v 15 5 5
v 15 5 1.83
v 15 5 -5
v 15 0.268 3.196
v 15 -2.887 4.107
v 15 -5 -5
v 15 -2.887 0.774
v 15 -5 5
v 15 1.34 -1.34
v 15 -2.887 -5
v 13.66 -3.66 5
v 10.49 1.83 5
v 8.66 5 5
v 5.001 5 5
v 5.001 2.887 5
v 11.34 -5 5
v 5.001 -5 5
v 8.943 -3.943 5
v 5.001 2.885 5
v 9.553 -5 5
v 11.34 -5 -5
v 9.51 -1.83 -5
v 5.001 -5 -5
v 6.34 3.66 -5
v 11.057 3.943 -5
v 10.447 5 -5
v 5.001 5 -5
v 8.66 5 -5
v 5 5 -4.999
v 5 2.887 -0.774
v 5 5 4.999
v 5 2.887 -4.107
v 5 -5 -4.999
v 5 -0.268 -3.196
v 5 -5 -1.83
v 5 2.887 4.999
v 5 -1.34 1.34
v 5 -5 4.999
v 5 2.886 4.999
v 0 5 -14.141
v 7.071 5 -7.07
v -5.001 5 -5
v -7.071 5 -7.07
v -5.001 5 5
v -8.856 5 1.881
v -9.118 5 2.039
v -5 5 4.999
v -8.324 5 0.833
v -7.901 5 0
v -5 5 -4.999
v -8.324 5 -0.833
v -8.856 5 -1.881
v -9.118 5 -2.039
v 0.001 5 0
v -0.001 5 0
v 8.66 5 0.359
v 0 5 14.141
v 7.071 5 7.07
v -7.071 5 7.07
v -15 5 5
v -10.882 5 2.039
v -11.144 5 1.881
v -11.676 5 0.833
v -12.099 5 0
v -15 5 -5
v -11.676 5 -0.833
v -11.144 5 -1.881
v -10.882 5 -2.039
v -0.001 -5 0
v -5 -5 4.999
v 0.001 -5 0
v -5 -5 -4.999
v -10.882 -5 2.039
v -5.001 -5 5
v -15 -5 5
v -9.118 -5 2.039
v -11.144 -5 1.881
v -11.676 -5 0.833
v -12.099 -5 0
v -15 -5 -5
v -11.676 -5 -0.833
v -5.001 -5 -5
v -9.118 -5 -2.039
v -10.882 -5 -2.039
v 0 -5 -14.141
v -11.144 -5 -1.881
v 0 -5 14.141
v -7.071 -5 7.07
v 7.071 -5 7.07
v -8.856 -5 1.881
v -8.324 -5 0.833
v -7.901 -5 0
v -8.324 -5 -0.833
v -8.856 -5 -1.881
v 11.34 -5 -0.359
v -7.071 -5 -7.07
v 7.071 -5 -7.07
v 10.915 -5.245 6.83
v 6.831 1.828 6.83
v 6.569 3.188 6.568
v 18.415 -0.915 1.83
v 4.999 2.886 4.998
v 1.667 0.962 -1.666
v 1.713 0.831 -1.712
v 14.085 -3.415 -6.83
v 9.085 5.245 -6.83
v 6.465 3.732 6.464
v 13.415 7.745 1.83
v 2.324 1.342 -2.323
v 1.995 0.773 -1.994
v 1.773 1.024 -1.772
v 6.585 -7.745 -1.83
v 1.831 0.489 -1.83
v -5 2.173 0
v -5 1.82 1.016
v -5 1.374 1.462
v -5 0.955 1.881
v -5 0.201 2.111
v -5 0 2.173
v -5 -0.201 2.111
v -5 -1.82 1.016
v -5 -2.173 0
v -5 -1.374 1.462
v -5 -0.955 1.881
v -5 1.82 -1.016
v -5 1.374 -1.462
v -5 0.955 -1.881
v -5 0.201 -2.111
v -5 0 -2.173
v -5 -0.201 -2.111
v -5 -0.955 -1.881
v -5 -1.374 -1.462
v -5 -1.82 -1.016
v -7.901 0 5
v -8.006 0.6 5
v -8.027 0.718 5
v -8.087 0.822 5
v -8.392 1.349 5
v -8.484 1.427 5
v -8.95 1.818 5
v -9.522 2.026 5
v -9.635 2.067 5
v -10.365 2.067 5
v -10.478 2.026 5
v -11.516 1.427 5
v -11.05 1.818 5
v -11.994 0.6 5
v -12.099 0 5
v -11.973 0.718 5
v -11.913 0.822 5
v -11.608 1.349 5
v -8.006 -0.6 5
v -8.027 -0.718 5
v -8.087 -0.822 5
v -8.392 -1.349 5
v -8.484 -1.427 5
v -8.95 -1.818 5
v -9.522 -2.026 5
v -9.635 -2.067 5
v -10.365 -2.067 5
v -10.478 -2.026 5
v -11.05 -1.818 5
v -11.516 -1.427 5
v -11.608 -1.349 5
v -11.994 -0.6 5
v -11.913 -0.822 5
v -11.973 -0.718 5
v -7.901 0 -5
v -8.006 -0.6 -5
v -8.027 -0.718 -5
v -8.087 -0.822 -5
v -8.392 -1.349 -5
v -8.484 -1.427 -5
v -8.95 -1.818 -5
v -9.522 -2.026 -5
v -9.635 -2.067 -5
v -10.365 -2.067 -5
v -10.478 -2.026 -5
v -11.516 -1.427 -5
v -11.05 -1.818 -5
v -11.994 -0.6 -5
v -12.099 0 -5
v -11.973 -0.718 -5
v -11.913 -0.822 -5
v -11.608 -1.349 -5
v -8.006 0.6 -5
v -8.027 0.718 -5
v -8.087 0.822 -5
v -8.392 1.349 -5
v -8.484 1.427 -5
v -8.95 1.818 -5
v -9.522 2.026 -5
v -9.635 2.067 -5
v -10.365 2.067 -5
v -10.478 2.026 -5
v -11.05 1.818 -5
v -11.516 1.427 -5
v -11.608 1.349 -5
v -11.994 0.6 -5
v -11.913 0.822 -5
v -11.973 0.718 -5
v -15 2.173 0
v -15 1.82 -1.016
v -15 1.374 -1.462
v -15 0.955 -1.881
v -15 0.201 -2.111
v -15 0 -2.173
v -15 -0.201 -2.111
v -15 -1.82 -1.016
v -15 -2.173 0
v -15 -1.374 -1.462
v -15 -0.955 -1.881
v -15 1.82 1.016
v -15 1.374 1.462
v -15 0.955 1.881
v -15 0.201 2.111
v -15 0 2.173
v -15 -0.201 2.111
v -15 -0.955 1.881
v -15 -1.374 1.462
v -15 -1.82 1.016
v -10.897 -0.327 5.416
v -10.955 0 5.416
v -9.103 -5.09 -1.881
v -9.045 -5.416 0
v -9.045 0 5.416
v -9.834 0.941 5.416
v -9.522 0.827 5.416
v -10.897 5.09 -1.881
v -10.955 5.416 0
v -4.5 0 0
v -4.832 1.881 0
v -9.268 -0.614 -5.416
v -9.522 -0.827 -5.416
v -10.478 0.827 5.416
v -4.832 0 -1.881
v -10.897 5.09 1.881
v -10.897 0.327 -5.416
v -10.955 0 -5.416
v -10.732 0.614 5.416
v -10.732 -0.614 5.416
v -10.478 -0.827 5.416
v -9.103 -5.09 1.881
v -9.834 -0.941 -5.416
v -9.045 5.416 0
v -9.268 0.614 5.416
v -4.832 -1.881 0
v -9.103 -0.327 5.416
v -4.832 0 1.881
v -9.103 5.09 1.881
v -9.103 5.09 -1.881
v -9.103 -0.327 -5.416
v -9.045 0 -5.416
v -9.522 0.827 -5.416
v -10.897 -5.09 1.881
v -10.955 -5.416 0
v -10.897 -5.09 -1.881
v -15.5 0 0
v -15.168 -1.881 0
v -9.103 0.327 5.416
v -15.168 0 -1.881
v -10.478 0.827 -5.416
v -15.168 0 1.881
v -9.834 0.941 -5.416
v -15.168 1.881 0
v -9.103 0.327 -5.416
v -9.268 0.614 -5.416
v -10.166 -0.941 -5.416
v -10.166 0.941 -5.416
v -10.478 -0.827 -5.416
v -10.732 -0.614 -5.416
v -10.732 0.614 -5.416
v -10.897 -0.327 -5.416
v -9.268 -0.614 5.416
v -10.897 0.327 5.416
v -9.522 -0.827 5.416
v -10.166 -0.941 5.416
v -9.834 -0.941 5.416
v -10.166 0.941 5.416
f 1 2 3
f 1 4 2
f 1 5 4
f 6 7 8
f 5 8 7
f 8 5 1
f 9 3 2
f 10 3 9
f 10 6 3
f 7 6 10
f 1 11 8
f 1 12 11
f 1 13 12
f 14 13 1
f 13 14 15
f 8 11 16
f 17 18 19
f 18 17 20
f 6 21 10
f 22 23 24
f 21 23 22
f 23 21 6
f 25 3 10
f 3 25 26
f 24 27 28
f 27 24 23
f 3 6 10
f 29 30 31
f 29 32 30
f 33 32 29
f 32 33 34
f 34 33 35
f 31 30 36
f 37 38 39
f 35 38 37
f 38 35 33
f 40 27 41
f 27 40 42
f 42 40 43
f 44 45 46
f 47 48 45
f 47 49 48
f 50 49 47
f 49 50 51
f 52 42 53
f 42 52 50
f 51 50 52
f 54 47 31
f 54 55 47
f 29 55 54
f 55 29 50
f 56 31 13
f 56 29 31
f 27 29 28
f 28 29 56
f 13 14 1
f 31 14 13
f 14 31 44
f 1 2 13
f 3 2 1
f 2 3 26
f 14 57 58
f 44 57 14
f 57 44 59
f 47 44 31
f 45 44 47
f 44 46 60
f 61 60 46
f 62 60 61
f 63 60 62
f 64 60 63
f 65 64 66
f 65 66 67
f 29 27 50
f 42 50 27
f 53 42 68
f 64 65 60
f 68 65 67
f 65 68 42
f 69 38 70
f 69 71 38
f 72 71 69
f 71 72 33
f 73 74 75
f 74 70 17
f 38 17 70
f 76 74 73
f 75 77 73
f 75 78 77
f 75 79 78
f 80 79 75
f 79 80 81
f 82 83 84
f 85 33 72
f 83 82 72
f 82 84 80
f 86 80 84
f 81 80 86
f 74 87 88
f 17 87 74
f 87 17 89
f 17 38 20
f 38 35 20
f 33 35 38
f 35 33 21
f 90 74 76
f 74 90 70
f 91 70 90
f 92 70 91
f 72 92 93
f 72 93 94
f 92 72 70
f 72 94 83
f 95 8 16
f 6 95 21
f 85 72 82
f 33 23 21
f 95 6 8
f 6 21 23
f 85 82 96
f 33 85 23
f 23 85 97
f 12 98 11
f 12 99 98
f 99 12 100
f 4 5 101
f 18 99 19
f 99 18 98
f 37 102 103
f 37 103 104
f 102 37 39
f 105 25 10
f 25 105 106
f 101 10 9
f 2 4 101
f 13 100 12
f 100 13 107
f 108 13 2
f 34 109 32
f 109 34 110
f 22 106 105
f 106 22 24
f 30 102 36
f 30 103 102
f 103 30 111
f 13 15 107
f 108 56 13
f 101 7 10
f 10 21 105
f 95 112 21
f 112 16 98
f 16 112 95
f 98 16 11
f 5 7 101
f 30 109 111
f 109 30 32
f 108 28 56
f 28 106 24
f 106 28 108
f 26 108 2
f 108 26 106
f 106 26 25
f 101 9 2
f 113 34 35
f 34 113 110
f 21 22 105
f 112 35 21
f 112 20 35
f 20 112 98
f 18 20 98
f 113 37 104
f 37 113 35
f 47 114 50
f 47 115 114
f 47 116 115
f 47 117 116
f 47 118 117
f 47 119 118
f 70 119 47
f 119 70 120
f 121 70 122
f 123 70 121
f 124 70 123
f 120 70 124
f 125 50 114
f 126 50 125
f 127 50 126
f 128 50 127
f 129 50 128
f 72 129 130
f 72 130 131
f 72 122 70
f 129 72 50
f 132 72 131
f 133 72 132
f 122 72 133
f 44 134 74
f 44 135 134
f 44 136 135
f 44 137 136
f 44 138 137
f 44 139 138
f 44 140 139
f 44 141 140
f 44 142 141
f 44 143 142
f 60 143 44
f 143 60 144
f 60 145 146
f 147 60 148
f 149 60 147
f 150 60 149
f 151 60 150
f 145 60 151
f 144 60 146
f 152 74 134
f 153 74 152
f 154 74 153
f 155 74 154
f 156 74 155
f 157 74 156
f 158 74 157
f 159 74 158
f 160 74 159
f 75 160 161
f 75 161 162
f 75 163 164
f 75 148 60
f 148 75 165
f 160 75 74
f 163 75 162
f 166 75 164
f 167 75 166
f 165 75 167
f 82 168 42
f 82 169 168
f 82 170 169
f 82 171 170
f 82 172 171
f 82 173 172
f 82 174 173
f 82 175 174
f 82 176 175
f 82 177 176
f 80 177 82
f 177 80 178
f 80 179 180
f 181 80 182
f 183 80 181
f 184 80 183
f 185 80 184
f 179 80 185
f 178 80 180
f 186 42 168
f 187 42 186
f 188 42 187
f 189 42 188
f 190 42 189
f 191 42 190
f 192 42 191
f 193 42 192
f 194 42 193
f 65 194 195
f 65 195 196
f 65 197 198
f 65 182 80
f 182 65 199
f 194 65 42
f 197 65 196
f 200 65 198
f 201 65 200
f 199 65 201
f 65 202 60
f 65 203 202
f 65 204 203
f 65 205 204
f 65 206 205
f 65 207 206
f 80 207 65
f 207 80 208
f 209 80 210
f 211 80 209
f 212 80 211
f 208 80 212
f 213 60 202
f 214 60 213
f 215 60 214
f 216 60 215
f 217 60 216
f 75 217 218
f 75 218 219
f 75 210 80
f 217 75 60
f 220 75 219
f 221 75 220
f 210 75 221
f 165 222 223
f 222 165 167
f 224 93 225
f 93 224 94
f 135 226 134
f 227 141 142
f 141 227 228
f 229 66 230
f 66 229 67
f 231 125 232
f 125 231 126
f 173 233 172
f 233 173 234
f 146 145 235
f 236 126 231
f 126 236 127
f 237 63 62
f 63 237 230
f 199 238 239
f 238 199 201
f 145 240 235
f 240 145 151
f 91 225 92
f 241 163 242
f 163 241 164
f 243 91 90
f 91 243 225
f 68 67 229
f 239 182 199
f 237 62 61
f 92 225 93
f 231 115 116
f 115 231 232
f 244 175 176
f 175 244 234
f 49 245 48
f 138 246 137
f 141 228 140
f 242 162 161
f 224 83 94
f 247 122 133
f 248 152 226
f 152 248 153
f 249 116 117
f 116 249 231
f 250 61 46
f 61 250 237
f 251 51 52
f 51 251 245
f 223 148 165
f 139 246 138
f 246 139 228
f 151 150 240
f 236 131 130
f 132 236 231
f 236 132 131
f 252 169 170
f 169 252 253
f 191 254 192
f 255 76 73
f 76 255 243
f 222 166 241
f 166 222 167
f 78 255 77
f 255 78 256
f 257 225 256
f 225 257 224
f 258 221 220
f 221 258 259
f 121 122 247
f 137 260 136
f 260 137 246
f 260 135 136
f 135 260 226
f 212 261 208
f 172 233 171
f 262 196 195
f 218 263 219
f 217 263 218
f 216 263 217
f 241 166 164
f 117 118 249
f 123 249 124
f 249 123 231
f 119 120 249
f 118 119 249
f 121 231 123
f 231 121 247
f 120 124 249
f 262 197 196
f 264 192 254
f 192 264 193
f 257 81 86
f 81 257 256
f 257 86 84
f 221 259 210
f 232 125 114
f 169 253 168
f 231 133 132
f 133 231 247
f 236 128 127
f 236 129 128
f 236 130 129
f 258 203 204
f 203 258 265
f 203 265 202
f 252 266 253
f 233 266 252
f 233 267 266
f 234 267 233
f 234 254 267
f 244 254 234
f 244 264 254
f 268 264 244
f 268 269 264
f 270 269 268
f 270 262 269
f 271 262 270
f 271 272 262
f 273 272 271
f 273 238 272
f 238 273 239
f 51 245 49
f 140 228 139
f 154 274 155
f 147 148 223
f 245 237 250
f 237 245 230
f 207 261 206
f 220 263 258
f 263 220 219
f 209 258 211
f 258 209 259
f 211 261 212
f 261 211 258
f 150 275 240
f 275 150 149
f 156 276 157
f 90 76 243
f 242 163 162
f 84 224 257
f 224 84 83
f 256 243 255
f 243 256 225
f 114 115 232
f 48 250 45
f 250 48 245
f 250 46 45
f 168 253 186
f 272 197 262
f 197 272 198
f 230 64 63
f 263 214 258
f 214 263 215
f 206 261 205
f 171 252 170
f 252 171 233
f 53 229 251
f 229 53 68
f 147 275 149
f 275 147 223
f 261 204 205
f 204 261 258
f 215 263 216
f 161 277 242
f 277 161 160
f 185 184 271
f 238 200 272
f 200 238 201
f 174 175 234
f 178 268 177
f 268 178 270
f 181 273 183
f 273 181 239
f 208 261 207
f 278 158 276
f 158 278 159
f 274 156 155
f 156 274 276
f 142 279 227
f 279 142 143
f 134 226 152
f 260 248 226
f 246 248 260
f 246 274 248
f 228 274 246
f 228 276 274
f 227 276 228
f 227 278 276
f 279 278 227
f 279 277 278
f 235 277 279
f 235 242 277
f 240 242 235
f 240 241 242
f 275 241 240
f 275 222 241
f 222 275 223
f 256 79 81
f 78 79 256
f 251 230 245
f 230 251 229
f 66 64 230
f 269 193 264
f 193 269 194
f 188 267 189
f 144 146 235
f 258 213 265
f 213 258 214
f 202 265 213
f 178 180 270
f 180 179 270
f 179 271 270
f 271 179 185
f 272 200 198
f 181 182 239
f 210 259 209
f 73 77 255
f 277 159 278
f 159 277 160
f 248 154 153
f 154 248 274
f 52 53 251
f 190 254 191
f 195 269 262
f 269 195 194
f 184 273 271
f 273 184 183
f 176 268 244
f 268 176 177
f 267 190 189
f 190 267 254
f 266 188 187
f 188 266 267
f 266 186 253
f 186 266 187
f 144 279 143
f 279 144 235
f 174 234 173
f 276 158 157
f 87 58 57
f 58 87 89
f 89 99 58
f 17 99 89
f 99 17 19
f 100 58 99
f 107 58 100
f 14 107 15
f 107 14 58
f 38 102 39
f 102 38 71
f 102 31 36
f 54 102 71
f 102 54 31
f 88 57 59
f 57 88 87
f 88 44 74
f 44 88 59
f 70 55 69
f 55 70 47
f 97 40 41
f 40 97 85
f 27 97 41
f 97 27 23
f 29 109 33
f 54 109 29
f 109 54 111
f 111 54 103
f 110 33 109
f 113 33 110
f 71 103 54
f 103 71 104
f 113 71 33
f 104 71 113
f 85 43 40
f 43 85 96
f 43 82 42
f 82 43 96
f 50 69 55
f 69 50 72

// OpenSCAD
module move(x=0,y=0,z=0,rx=0,ry=0,rz=0)
{ translate([x,y,z])rotate([rx,ry,rz]) children(); }
   
move(10)           { cube(10,true); rotate([0,30,30]) color("red") cube(10,true); }
move(-10)          { color("gold") union() { cube(10,true); color("blue") sphere(d=11); } }
move(z=7.07, ry=45)cube(10,true);
move(z=-7.07,ry=45)cube(10,true);
